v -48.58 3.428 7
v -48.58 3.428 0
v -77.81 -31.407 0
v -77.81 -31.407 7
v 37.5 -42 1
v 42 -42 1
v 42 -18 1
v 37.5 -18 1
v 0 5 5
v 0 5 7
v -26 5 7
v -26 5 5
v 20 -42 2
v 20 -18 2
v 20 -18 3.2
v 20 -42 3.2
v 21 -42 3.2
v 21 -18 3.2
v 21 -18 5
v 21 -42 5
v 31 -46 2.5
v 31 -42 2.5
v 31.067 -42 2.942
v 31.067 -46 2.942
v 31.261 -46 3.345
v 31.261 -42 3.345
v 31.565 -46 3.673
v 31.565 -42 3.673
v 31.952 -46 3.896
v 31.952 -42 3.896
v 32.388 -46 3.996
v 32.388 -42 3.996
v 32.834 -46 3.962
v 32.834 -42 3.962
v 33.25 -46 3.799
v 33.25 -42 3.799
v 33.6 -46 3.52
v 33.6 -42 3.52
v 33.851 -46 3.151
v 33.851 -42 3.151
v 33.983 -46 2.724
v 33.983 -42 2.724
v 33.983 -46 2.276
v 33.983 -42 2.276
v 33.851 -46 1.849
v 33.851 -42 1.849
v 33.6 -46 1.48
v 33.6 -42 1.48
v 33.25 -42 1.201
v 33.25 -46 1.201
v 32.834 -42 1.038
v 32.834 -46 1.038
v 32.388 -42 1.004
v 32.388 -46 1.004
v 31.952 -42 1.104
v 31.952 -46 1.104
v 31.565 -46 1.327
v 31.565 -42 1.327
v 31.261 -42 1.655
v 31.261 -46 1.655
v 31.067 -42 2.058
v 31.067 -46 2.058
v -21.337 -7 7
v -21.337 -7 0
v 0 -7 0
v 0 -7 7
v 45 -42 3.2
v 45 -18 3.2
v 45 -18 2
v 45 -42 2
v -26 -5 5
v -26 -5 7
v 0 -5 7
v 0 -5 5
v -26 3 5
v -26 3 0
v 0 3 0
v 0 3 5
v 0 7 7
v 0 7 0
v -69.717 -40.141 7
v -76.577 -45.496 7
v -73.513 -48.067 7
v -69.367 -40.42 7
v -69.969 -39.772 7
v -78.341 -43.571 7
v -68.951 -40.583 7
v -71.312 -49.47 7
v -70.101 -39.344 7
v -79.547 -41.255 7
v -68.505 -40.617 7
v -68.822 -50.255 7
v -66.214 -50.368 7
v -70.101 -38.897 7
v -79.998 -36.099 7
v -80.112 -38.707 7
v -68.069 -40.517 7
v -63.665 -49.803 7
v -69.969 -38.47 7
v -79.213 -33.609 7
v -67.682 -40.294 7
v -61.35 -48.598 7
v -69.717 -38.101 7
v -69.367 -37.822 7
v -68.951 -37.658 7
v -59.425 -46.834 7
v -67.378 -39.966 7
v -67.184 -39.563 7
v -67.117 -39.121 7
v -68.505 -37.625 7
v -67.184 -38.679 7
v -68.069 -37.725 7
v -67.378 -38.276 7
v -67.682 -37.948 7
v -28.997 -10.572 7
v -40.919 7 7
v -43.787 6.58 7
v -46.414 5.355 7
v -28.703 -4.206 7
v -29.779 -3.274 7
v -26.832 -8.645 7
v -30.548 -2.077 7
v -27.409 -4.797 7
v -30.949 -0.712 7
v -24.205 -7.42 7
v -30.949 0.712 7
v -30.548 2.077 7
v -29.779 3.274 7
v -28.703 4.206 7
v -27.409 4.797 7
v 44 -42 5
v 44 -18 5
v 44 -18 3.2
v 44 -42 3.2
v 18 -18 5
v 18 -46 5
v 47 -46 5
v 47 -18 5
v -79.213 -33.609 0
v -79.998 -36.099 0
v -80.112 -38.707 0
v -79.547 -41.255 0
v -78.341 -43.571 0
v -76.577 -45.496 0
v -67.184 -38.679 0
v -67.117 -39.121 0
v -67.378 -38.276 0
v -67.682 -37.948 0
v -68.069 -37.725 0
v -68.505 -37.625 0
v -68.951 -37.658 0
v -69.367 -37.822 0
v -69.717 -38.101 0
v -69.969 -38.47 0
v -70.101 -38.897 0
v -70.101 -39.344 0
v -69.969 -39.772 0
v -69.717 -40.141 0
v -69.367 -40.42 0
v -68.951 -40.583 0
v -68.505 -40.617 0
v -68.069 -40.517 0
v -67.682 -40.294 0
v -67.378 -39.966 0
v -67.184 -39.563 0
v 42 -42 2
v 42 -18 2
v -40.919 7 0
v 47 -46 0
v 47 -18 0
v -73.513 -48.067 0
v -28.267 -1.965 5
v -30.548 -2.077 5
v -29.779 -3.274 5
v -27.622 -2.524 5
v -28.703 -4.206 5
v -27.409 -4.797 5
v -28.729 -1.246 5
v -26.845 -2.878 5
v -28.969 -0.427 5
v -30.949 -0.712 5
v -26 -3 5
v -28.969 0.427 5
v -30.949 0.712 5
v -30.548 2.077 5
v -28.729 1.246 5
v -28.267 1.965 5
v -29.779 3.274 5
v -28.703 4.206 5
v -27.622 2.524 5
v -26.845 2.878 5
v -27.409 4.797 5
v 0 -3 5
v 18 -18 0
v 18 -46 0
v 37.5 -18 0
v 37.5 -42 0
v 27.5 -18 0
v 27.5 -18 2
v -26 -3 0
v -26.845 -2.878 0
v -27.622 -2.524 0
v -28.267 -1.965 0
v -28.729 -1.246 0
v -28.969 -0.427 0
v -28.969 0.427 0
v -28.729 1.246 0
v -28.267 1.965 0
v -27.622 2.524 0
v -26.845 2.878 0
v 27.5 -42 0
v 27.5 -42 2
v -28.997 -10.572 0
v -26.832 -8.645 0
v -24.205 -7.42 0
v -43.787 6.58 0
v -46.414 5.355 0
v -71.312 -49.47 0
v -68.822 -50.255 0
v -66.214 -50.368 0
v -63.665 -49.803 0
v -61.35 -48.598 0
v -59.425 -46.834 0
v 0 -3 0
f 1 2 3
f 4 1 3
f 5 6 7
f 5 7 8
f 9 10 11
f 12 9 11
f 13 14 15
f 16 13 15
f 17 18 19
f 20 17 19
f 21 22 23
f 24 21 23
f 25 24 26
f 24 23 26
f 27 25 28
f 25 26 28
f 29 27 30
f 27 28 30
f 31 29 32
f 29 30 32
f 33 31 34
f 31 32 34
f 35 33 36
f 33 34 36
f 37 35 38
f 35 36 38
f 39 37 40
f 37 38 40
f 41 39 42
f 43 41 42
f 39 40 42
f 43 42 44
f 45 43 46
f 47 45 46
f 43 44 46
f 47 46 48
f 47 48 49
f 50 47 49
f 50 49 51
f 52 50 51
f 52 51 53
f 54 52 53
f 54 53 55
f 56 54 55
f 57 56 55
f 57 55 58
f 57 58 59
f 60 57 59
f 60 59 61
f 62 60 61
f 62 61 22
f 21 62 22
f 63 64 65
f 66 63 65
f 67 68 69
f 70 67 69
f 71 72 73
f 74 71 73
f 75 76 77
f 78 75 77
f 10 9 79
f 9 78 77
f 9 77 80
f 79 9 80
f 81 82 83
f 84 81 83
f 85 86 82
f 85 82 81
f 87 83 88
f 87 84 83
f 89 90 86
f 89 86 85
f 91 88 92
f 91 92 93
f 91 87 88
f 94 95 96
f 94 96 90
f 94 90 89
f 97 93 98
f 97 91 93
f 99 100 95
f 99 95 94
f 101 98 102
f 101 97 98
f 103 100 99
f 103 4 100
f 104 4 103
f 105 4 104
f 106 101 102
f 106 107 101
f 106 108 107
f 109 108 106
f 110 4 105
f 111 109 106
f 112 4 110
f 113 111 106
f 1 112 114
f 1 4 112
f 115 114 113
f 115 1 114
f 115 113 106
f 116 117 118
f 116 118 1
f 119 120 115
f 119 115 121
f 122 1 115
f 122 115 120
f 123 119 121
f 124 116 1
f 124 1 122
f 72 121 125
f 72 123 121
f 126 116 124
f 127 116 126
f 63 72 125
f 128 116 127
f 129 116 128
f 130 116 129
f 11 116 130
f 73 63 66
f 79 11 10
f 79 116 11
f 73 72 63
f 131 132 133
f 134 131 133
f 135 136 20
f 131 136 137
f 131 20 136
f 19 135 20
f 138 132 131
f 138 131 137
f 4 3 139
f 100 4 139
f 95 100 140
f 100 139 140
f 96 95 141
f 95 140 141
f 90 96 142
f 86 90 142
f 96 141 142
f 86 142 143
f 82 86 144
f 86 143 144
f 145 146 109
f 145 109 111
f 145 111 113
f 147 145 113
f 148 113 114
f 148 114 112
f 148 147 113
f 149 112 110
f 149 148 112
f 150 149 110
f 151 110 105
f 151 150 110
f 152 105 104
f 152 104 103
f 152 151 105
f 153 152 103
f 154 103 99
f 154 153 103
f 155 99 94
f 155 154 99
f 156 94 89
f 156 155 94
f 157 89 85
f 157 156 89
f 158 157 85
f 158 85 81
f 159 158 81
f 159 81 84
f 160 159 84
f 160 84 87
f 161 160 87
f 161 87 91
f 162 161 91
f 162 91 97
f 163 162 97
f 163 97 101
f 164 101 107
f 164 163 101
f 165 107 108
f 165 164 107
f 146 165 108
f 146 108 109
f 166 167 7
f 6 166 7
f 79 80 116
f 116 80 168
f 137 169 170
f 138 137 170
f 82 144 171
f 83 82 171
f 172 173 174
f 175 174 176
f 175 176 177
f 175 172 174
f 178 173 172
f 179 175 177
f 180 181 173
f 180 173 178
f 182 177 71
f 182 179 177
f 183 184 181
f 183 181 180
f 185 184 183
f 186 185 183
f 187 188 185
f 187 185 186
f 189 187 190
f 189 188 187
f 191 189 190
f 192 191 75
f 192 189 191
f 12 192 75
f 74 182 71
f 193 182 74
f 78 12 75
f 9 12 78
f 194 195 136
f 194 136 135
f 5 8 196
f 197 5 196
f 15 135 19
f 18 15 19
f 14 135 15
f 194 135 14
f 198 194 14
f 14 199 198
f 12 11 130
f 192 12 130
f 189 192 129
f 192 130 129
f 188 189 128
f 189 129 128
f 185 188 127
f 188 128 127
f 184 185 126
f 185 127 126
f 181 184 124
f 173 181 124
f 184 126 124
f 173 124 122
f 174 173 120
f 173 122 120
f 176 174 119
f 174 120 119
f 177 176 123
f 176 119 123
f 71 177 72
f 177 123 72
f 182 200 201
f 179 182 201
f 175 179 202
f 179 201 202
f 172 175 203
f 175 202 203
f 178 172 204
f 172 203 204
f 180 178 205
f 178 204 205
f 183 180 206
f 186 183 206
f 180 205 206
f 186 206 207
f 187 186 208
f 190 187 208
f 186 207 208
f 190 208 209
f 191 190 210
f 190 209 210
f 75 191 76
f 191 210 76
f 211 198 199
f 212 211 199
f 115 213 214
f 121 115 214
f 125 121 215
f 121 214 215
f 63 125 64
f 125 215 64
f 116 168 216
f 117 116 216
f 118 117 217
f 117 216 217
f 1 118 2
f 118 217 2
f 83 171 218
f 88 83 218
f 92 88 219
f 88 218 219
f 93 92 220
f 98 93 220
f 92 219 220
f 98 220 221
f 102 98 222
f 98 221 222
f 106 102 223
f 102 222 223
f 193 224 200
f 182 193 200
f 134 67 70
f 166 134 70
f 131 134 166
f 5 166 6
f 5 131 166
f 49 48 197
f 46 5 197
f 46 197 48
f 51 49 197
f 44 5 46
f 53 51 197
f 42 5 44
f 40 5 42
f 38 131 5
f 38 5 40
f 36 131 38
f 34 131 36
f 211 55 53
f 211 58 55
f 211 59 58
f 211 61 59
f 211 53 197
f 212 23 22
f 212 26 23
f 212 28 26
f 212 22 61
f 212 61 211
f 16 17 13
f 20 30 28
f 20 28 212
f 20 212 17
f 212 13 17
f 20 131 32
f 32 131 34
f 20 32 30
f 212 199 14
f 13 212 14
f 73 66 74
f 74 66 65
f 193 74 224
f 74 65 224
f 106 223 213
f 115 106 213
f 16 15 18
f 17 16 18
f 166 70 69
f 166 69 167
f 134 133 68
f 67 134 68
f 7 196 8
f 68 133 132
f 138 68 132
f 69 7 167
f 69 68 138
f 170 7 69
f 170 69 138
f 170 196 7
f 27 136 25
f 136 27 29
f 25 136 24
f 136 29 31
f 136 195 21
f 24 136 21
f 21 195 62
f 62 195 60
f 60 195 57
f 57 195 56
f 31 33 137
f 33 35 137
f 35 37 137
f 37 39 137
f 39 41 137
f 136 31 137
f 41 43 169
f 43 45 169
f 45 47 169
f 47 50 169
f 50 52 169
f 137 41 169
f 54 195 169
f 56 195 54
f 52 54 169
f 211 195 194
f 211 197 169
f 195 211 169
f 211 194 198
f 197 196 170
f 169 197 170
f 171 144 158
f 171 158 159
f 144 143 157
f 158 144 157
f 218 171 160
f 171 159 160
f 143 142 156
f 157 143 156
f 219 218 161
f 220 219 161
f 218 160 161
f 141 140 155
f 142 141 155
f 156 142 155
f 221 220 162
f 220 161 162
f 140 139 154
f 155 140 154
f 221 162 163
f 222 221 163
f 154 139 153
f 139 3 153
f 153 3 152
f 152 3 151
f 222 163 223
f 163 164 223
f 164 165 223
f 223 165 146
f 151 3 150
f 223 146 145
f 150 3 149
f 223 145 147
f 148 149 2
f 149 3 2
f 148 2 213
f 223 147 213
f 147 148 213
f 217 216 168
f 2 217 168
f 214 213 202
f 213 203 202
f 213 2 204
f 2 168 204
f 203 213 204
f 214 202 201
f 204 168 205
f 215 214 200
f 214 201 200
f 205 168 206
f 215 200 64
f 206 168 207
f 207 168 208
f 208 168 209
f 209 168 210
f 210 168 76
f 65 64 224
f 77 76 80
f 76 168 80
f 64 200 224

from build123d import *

# Parameters (mm, degrees)
F0_R     = 1.5
F1_DEPTH = 7
F3_DEPTH = 2
F4_W     = 29
F4_H     = 28
F4_W_2   = 25
F4_H_2   = 24
F5_DEPTH = 5
F7_DEPTH = 24
F8_R     = 1.5
F9_DEPTH = 25


with BuildPart() as f1:
    # F0 (on Top) → F1 (new body)
    with BuildSketch(Plane.XY):
        with BuildLine():
            Line((0, 3), (0, 7))
            Line((0, 7), (-40.919304, 7))
            ThreePointArc((-40.919304, 7), (-45.145486, 6.063078), (-48.579748, 3.427876))
            Line((-48.579748, 3.427876), (-77.810022, -31.407408))
            ThreePointArc((-77.810022, -31.407408), (-80.111525, -38.706842), (-76.577454, -45.495729))
            Line((-76.577454, -45.495729), (-73.513276, -48.066879))
            ThreePointArc((-73.513276, -48.066879), (-66.213843, -50.368382), (-59.424956, -46.834311))
            Line((-59.424956, -46.834311), (-28.997368, -10.572124))
            ThreePointArc((-28.997368, -10.572124), (-25.563106, -7.936922), (-21.336923, -7))
            Line((-21.336923, -7), (0, -7))
            Line((0, -7), (0, -3))
            Line((0, -3), (-26, -3))
            ThreePointArc((-26, -3), (-29, 0), (-26, 3))
            Line((-26, 3), (0, 3))
        make_face()
        with Locations((-68.617489, -39.12086)):
            Circle(F0_R, mode=Mode.SUBTRACT)
    extrude(amount=F1_DEPTH)

    # F2 (on face) → F3 (cut)
    with BuildSketch(Plane.XY.offset(7)):
        with BuildLine():
            Line((0, 5), (-26, 5))
            ThreePointArc((-26, 5), (-31, 0), (-26, -5))
            Line((-26, -5), (0, -5))
            Line((0, -5), (0, -3))
            Line((0, -3), (-26, -3))
            ThreePointArc((-26, -3), (-29, 0), (-26, 3))
            Line((-26, 3), (0, 3))
            Line((0, 3), (0, 5))
        make_face()
    extrude(amount=-F3_DEPTH, mode=Mode.SUBTRACT)


with BuildPart() as f5:
    # F4 (on Top) → F5 (new body)
    with BuildSketch(Plane.XY):
        with Locations((32.5, -32)):
            Rectangle(F4_W, F4_H)
        with Locations((32.5, -32)):
            Rectangle(F4_W_2, F4_H_2, mode=Mode.SUBTRACT)
        with Locations((32.5, -32)):
            Rectangle(F4_W_2, F4_H_2)
    extrude(amount=F5_DEPTH)

    # F6 (on face) → F7 (cut)
    with BuildSketch(Plane(origin=(0, -18, 0), x_dir=(-1, 0, 0), z_dir=(0, 1, 0))):
        Polygon((-44, 3.2), (-45, 3.2), (-45, 2), (-42, 2), (-42, 1), (-37.5, 1), (-37.5, 0), (-27.5, 0), (-27.5, 2), (-20, 2), (-20, 3.2), (-21, 3.2), (-21, 5), (-44, 5), align=None)
    extrude(amount=-F7_DEPTH, mode=Mode.SUBTRACT)

    # F8 (on face) → F9 (cut)
    with BuildSketch(Plane(origin=(0, -42, 0), x_dir=(-1, 0, 0), z_dir=(0, 1, 0))):
        with Locations((-32.5, 2.5)):
            Circle(F8_R)
    extrude(amount=-F9_DEPTH, mode=Mode.SUBTRACT)


solid = Compound([f1.part, f5.part])
